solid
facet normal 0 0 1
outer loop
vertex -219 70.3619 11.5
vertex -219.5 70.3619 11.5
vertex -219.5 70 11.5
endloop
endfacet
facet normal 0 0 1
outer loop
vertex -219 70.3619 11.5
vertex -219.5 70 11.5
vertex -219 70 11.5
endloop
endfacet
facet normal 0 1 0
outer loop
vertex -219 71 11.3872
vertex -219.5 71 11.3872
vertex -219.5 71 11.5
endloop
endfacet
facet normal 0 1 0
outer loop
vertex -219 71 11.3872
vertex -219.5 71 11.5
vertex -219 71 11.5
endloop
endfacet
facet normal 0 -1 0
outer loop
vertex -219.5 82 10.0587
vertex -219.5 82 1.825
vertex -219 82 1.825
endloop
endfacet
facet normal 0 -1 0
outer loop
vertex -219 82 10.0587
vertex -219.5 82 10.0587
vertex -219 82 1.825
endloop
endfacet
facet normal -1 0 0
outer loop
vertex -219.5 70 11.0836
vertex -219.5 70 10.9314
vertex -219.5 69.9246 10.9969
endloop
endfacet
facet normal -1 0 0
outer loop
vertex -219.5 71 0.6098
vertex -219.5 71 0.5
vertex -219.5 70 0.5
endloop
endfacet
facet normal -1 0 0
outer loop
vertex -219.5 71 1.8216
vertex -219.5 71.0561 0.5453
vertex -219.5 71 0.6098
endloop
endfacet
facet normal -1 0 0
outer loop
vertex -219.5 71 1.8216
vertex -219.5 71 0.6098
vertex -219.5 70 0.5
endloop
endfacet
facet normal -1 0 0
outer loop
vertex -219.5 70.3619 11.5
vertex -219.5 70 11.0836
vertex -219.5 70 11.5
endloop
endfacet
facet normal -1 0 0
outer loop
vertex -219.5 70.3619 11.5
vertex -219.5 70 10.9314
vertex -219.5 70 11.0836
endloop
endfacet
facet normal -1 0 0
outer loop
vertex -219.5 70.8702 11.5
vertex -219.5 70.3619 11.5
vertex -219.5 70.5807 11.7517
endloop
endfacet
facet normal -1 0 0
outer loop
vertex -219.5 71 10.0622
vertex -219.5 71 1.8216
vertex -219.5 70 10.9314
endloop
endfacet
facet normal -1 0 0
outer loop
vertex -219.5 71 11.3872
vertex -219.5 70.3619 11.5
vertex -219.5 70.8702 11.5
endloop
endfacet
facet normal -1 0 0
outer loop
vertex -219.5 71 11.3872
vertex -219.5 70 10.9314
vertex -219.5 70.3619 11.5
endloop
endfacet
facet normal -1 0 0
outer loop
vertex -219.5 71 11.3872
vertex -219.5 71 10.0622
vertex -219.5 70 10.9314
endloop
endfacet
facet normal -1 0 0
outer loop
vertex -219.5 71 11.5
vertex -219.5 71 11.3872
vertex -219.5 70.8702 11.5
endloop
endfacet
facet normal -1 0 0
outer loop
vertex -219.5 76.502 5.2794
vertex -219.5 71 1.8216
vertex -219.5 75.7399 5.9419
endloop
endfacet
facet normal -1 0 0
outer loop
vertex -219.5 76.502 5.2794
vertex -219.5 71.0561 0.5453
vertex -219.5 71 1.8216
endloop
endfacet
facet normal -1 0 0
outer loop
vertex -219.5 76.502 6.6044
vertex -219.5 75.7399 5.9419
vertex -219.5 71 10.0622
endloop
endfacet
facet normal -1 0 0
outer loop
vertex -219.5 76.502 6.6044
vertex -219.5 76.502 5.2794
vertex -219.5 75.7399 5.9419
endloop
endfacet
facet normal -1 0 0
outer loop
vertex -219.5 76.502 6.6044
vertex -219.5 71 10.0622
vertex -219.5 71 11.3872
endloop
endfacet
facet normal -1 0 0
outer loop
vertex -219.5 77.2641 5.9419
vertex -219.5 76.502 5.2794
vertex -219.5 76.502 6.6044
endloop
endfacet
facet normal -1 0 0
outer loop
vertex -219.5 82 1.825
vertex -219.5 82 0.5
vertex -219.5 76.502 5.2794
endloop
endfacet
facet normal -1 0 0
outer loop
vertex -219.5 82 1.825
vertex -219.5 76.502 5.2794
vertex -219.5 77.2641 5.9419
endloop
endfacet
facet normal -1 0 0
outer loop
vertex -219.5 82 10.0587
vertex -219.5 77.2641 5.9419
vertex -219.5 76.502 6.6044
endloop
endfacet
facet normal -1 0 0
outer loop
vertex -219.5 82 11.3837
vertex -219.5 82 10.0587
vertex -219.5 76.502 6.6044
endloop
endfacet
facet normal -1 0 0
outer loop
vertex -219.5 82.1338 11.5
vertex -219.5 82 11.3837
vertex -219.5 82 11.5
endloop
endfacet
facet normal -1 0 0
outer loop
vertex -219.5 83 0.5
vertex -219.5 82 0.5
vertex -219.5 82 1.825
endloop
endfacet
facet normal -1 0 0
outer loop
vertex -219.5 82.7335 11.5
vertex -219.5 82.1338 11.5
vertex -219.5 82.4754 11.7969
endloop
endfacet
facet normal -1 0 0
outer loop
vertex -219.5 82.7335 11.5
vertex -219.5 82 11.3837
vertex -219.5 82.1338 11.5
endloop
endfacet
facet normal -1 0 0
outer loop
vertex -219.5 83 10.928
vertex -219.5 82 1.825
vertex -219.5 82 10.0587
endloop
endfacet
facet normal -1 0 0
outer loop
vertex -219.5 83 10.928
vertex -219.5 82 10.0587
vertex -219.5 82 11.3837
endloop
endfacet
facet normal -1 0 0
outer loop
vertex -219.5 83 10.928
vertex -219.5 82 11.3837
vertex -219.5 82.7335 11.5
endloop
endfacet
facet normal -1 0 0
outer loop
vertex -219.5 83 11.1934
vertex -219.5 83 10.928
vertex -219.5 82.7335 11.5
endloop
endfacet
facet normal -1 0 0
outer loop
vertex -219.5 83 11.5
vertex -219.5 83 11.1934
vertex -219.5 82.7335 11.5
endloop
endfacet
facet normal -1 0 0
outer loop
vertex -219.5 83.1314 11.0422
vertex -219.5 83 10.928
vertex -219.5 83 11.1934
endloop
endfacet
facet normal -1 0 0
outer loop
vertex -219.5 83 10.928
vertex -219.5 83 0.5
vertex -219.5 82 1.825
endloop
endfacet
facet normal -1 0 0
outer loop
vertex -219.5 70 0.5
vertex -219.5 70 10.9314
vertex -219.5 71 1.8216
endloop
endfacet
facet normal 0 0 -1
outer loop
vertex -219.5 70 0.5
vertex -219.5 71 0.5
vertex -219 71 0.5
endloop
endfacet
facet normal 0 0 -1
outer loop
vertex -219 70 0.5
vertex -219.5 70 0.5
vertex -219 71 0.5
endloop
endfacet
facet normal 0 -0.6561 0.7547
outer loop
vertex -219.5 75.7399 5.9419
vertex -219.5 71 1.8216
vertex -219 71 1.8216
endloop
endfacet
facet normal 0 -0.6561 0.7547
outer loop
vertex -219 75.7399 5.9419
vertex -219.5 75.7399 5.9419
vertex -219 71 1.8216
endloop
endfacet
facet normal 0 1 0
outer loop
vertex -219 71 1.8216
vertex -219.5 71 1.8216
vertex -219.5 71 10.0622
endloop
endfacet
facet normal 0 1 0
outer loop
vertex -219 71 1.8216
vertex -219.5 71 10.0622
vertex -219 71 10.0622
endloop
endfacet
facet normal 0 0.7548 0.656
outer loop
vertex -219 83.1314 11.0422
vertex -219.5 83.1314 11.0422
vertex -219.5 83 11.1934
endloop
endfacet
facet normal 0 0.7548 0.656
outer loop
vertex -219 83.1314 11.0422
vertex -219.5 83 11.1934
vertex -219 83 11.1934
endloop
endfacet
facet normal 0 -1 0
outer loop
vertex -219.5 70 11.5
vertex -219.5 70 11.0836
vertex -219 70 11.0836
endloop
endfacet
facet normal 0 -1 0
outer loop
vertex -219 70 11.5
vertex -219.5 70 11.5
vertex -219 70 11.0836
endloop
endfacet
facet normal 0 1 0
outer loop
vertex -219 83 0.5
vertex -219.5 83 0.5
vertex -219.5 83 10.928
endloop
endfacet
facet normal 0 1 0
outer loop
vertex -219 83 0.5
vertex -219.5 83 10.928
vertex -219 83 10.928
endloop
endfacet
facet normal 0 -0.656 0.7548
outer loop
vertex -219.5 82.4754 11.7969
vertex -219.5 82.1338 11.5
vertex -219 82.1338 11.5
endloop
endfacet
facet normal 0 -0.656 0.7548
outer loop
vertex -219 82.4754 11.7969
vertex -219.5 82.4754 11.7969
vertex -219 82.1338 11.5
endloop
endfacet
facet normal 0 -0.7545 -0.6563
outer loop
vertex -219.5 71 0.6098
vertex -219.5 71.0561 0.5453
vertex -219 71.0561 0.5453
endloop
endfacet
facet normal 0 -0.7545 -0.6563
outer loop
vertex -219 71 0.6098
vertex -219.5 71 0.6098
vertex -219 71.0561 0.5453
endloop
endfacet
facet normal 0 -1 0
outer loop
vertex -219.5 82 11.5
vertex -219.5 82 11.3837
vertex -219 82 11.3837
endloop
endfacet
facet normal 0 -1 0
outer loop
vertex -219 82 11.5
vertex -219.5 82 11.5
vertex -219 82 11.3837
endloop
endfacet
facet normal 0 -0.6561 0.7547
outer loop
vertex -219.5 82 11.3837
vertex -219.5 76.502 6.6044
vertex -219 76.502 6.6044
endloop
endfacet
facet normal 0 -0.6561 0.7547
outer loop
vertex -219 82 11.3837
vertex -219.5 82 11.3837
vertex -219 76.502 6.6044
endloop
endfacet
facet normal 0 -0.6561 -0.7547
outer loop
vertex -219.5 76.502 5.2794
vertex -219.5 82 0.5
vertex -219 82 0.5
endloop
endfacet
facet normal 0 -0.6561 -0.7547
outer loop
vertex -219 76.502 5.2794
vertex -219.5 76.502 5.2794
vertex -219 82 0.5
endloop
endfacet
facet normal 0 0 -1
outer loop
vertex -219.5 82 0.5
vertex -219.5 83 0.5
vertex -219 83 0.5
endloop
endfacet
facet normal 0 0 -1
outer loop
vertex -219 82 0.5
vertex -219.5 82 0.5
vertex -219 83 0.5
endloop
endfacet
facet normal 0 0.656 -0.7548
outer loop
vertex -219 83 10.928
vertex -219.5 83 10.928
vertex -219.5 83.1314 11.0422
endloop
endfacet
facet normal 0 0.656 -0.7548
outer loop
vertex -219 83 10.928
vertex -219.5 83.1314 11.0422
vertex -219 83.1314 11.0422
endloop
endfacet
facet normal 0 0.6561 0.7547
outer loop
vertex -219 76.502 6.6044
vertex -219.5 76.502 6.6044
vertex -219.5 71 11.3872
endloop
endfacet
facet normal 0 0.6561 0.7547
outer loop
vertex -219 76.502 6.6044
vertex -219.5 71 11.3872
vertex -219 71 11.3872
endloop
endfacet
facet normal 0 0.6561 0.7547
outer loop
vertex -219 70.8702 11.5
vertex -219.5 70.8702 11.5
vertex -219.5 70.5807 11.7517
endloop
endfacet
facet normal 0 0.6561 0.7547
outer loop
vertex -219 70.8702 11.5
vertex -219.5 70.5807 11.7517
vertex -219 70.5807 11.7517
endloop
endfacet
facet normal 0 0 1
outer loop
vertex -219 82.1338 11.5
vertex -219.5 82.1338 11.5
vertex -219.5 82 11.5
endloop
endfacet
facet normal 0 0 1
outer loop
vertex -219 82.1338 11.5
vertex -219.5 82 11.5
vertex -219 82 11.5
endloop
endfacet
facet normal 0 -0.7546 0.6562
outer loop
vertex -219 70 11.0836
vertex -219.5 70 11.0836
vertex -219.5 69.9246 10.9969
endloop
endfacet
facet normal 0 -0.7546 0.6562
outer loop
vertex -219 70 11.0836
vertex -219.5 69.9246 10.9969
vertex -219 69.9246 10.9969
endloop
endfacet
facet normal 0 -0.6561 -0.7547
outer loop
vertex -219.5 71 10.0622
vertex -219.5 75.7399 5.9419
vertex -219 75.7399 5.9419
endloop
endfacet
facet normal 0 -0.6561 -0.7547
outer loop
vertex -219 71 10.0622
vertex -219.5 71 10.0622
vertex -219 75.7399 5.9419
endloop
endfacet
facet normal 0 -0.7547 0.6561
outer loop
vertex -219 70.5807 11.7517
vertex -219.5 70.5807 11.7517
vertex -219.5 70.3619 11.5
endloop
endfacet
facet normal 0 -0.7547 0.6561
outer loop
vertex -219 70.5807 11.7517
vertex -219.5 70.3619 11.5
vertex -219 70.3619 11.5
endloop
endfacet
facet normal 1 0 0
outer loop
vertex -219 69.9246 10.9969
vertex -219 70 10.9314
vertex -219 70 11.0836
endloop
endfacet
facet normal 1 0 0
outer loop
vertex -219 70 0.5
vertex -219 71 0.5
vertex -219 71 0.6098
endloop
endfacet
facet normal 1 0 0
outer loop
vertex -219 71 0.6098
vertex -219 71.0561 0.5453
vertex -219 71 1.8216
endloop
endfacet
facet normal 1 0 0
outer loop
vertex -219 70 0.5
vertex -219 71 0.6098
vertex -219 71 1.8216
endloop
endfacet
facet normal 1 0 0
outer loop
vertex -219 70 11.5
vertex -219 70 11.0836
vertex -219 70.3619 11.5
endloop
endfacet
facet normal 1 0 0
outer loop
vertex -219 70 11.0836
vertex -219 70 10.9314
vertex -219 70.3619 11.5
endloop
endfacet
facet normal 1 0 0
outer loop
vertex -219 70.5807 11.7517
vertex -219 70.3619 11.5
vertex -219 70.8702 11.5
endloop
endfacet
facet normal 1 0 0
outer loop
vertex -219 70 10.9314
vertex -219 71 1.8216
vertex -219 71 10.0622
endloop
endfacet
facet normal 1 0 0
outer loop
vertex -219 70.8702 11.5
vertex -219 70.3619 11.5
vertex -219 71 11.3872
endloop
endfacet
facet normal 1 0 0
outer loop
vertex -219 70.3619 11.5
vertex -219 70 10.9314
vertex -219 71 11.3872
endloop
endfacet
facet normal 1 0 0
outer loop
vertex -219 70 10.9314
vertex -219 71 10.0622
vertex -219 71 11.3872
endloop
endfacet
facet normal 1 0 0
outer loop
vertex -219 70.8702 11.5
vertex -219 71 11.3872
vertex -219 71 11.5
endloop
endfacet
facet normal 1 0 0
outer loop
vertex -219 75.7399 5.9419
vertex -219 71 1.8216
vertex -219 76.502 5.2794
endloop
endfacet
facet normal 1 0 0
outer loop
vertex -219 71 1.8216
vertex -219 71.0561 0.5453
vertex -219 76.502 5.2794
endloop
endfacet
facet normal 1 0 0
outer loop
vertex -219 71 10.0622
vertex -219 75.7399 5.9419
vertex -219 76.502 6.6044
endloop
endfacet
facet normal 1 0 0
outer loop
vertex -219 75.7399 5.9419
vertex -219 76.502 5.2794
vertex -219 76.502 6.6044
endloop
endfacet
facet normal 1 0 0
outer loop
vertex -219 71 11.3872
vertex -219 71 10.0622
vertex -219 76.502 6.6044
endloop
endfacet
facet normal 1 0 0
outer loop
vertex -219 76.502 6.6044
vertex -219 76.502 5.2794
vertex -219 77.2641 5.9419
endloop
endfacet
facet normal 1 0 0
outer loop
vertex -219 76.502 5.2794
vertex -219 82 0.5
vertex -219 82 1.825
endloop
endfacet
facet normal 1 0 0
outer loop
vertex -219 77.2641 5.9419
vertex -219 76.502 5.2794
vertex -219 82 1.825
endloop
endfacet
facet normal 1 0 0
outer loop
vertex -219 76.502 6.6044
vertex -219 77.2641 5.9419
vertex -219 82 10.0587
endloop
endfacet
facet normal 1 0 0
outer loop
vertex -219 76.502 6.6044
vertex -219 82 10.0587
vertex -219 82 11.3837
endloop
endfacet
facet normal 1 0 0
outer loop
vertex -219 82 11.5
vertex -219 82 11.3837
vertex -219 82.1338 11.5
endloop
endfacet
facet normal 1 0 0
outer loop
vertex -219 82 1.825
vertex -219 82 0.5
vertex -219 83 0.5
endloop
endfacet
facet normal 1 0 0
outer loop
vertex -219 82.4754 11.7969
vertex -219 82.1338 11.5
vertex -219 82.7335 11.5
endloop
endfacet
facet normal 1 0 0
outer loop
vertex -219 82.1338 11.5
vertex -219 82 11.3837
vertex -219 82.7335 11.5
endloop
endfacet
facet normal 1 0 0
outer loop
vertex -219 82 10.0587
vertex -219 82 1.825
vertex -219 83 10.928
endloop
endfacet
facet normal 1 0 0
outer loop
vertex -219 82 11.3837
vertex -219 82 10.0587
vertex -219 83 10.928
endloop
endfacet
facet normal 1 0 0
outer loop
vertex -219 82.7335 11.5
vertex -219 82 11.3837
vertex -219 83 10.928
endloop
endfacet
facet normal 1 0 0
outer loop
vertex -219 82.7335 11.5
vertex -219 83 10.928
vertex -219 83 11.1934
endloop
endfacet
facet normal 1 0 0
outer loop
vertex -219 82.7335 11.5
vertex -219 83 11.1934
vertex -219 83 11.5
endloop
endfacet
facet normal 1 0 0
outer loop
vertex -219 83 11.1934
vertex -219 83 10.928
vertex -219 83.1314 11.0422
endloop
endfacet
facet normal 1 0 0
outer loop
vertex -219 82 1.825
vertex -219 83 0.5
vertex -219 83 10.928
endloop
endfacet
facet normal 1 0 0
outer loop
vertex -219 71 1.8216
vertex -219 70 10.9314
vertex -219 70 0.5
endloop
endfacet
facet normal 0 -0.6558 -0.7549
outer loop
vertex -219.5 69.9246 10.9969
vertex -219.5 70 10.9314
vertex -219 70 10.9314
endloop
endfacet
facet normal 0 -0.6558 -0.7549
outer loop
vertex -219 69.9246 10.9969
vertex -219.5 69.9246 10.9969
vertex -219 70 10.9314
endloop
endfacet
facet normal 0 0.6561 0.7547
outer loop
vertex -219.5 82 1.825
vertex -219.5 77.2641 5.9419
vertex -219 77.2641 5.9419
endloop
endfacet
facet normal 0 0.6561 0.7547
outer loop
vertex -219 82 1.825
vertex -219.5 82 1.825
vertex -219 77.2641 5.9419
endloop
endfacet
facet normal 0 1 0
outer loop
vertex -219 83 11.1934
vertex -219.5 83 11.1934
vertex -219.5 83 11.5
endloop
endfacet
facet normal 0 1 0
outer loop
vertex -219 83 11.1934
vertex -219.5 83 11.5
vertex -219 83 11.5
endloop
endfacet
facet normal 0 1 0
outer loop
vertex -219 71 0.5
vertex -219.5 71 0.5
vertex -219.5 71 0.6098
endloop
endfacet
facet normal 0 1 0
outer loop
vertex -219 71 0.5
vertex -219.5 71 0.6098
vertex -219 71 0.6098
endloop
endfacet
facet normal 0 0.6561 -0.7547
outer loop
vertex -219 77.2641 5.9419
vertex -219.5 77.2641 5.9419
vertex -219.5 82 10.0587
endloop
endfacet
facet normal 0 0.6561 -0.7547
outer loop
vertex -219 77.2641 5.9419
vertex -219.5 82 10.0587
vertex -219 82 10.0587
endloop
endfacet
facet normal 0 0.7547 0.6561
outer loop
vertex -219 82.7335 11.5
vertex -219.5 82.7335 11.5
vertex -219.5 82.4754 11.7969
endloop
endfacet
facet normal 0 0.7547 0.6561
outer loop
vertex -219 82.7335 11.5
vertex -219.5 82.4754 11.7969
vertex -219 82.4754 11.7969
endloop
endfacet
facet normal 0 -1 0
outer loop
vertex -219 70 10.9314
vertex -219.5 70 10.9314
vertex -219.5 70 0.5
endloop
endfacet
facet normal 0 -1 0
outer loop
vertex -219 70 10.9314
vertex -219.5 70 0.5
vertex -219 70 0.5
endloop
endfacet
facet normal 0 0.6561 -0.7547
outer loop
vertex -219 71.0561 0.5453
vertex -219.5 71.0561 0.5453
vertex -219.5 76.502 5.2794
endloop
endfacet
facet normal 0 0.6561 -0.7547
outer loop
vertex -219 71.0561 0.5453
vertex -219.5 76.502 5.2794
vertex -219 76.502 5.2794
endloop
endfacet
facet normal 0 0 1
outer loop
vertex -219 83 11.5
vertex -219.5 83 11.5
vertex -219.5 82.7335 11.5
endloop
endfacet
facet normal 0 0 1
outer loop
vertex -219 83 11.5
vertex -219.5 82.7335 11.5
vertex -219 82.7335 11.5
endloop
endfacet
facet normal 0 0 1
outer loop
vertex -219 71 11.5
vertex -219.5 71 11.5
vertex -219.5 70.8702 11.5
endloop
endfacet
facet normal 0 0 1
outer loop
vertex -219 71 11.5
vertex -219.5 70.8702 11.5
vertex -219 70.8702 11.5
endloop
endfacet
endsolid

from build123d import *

# Parameters (mm, degrees)
BOX208_W          = 0.5
BOX208_H          = 1
BOX208_DEPTH      = 11
BOX209_W          = 0.5
BOX209_H          = 1
BOX209_DEPTH      = 16
BOX209_ROLL_ANGLE = 49
BOX210_W          = 0.5
BOX210_H          = 1
BOX210_DEPTH      = 16
BOX210_ROLL_ANGLE = -49
BOX207_W          = 0.5
BOX207_H          = 1
BOX207_DEPTH      = 11


with BuildPart() as cubo208:
    # Box208 → Box208 (new body)
    with BuildSketch(Plane(origin=(0, 12, 0.5), x_dir=(1, 0, 0), z_dir=(0, 0, 1))):
        with Locations((0.25, 0.5)):
            Rectangle(BOX208_W, BOX208_H)
    extrude(amount=BOX208_DEPTH)


with BuildPart() as cubo209:
    # Box209 → Box209 (new body)
    with BuildSketch(Plane.XY):
        with Locations((0.25, 0.5)):
            Rectangle(BOX209_W, BOX209_H)
    extrude(amount=BOX209_DEPTH)


with BuildPart() as cubo209_1:
    # Box209 roll: moved
    add(cubo209.part.rotate(Axis((0, 0, 0), (1, 0, 0)), BOX209_ROLL_ANGLE))


with BuildPart() as cubo209_2:
    # Box209 placement: moved
    add(cubo209_1.part.moved(Location((0, 12, 0.5))))


with BuildPart() as cubo210:
    # Box210 → Box210 (new body)
    with BuildSketch(Plane.XY):
        with Locations((0.25, 0.5)):
            Rectangle(BOX210_W, BOX210_H)
    extrude(amount=BOX210_DEPTH)


with BuildPart() as cubo210_1:
    # Box210 roll: moved
    add(cubo210.part.rotate(Axis((0, 0, 0), (1, 0, 0)), BOX210_ROLL_ANGLE))


with BuildPart() as cubo210_2:
    # Box210 placement: moved
    add(cubo210_1.part.moved(Location((0, 0.4, 1.3))))


with BuildPart() as fusion014:
    # Box207 → Box207 (new body)
    with BuildSketch(Plane.XY.offset(0.5)):
        with Locations((0.25, 0.5)):
            Rectangle(BOX207_W, BOX207_H)
    extrude(amount=BOX207_DEPTH)

    # Fusion014: union Cubo208, Cubo209, Cubo210
    add(cubo208.part)
    add(cubo209_2.part)
    add(cubo210_2.part)


with BuildPart() as fusion014_1:
    # Fusion014 placement: moved
    add(fusion014.part.moved(Location((-219.5, 70, 0))))


solid = fusion014_1.part
